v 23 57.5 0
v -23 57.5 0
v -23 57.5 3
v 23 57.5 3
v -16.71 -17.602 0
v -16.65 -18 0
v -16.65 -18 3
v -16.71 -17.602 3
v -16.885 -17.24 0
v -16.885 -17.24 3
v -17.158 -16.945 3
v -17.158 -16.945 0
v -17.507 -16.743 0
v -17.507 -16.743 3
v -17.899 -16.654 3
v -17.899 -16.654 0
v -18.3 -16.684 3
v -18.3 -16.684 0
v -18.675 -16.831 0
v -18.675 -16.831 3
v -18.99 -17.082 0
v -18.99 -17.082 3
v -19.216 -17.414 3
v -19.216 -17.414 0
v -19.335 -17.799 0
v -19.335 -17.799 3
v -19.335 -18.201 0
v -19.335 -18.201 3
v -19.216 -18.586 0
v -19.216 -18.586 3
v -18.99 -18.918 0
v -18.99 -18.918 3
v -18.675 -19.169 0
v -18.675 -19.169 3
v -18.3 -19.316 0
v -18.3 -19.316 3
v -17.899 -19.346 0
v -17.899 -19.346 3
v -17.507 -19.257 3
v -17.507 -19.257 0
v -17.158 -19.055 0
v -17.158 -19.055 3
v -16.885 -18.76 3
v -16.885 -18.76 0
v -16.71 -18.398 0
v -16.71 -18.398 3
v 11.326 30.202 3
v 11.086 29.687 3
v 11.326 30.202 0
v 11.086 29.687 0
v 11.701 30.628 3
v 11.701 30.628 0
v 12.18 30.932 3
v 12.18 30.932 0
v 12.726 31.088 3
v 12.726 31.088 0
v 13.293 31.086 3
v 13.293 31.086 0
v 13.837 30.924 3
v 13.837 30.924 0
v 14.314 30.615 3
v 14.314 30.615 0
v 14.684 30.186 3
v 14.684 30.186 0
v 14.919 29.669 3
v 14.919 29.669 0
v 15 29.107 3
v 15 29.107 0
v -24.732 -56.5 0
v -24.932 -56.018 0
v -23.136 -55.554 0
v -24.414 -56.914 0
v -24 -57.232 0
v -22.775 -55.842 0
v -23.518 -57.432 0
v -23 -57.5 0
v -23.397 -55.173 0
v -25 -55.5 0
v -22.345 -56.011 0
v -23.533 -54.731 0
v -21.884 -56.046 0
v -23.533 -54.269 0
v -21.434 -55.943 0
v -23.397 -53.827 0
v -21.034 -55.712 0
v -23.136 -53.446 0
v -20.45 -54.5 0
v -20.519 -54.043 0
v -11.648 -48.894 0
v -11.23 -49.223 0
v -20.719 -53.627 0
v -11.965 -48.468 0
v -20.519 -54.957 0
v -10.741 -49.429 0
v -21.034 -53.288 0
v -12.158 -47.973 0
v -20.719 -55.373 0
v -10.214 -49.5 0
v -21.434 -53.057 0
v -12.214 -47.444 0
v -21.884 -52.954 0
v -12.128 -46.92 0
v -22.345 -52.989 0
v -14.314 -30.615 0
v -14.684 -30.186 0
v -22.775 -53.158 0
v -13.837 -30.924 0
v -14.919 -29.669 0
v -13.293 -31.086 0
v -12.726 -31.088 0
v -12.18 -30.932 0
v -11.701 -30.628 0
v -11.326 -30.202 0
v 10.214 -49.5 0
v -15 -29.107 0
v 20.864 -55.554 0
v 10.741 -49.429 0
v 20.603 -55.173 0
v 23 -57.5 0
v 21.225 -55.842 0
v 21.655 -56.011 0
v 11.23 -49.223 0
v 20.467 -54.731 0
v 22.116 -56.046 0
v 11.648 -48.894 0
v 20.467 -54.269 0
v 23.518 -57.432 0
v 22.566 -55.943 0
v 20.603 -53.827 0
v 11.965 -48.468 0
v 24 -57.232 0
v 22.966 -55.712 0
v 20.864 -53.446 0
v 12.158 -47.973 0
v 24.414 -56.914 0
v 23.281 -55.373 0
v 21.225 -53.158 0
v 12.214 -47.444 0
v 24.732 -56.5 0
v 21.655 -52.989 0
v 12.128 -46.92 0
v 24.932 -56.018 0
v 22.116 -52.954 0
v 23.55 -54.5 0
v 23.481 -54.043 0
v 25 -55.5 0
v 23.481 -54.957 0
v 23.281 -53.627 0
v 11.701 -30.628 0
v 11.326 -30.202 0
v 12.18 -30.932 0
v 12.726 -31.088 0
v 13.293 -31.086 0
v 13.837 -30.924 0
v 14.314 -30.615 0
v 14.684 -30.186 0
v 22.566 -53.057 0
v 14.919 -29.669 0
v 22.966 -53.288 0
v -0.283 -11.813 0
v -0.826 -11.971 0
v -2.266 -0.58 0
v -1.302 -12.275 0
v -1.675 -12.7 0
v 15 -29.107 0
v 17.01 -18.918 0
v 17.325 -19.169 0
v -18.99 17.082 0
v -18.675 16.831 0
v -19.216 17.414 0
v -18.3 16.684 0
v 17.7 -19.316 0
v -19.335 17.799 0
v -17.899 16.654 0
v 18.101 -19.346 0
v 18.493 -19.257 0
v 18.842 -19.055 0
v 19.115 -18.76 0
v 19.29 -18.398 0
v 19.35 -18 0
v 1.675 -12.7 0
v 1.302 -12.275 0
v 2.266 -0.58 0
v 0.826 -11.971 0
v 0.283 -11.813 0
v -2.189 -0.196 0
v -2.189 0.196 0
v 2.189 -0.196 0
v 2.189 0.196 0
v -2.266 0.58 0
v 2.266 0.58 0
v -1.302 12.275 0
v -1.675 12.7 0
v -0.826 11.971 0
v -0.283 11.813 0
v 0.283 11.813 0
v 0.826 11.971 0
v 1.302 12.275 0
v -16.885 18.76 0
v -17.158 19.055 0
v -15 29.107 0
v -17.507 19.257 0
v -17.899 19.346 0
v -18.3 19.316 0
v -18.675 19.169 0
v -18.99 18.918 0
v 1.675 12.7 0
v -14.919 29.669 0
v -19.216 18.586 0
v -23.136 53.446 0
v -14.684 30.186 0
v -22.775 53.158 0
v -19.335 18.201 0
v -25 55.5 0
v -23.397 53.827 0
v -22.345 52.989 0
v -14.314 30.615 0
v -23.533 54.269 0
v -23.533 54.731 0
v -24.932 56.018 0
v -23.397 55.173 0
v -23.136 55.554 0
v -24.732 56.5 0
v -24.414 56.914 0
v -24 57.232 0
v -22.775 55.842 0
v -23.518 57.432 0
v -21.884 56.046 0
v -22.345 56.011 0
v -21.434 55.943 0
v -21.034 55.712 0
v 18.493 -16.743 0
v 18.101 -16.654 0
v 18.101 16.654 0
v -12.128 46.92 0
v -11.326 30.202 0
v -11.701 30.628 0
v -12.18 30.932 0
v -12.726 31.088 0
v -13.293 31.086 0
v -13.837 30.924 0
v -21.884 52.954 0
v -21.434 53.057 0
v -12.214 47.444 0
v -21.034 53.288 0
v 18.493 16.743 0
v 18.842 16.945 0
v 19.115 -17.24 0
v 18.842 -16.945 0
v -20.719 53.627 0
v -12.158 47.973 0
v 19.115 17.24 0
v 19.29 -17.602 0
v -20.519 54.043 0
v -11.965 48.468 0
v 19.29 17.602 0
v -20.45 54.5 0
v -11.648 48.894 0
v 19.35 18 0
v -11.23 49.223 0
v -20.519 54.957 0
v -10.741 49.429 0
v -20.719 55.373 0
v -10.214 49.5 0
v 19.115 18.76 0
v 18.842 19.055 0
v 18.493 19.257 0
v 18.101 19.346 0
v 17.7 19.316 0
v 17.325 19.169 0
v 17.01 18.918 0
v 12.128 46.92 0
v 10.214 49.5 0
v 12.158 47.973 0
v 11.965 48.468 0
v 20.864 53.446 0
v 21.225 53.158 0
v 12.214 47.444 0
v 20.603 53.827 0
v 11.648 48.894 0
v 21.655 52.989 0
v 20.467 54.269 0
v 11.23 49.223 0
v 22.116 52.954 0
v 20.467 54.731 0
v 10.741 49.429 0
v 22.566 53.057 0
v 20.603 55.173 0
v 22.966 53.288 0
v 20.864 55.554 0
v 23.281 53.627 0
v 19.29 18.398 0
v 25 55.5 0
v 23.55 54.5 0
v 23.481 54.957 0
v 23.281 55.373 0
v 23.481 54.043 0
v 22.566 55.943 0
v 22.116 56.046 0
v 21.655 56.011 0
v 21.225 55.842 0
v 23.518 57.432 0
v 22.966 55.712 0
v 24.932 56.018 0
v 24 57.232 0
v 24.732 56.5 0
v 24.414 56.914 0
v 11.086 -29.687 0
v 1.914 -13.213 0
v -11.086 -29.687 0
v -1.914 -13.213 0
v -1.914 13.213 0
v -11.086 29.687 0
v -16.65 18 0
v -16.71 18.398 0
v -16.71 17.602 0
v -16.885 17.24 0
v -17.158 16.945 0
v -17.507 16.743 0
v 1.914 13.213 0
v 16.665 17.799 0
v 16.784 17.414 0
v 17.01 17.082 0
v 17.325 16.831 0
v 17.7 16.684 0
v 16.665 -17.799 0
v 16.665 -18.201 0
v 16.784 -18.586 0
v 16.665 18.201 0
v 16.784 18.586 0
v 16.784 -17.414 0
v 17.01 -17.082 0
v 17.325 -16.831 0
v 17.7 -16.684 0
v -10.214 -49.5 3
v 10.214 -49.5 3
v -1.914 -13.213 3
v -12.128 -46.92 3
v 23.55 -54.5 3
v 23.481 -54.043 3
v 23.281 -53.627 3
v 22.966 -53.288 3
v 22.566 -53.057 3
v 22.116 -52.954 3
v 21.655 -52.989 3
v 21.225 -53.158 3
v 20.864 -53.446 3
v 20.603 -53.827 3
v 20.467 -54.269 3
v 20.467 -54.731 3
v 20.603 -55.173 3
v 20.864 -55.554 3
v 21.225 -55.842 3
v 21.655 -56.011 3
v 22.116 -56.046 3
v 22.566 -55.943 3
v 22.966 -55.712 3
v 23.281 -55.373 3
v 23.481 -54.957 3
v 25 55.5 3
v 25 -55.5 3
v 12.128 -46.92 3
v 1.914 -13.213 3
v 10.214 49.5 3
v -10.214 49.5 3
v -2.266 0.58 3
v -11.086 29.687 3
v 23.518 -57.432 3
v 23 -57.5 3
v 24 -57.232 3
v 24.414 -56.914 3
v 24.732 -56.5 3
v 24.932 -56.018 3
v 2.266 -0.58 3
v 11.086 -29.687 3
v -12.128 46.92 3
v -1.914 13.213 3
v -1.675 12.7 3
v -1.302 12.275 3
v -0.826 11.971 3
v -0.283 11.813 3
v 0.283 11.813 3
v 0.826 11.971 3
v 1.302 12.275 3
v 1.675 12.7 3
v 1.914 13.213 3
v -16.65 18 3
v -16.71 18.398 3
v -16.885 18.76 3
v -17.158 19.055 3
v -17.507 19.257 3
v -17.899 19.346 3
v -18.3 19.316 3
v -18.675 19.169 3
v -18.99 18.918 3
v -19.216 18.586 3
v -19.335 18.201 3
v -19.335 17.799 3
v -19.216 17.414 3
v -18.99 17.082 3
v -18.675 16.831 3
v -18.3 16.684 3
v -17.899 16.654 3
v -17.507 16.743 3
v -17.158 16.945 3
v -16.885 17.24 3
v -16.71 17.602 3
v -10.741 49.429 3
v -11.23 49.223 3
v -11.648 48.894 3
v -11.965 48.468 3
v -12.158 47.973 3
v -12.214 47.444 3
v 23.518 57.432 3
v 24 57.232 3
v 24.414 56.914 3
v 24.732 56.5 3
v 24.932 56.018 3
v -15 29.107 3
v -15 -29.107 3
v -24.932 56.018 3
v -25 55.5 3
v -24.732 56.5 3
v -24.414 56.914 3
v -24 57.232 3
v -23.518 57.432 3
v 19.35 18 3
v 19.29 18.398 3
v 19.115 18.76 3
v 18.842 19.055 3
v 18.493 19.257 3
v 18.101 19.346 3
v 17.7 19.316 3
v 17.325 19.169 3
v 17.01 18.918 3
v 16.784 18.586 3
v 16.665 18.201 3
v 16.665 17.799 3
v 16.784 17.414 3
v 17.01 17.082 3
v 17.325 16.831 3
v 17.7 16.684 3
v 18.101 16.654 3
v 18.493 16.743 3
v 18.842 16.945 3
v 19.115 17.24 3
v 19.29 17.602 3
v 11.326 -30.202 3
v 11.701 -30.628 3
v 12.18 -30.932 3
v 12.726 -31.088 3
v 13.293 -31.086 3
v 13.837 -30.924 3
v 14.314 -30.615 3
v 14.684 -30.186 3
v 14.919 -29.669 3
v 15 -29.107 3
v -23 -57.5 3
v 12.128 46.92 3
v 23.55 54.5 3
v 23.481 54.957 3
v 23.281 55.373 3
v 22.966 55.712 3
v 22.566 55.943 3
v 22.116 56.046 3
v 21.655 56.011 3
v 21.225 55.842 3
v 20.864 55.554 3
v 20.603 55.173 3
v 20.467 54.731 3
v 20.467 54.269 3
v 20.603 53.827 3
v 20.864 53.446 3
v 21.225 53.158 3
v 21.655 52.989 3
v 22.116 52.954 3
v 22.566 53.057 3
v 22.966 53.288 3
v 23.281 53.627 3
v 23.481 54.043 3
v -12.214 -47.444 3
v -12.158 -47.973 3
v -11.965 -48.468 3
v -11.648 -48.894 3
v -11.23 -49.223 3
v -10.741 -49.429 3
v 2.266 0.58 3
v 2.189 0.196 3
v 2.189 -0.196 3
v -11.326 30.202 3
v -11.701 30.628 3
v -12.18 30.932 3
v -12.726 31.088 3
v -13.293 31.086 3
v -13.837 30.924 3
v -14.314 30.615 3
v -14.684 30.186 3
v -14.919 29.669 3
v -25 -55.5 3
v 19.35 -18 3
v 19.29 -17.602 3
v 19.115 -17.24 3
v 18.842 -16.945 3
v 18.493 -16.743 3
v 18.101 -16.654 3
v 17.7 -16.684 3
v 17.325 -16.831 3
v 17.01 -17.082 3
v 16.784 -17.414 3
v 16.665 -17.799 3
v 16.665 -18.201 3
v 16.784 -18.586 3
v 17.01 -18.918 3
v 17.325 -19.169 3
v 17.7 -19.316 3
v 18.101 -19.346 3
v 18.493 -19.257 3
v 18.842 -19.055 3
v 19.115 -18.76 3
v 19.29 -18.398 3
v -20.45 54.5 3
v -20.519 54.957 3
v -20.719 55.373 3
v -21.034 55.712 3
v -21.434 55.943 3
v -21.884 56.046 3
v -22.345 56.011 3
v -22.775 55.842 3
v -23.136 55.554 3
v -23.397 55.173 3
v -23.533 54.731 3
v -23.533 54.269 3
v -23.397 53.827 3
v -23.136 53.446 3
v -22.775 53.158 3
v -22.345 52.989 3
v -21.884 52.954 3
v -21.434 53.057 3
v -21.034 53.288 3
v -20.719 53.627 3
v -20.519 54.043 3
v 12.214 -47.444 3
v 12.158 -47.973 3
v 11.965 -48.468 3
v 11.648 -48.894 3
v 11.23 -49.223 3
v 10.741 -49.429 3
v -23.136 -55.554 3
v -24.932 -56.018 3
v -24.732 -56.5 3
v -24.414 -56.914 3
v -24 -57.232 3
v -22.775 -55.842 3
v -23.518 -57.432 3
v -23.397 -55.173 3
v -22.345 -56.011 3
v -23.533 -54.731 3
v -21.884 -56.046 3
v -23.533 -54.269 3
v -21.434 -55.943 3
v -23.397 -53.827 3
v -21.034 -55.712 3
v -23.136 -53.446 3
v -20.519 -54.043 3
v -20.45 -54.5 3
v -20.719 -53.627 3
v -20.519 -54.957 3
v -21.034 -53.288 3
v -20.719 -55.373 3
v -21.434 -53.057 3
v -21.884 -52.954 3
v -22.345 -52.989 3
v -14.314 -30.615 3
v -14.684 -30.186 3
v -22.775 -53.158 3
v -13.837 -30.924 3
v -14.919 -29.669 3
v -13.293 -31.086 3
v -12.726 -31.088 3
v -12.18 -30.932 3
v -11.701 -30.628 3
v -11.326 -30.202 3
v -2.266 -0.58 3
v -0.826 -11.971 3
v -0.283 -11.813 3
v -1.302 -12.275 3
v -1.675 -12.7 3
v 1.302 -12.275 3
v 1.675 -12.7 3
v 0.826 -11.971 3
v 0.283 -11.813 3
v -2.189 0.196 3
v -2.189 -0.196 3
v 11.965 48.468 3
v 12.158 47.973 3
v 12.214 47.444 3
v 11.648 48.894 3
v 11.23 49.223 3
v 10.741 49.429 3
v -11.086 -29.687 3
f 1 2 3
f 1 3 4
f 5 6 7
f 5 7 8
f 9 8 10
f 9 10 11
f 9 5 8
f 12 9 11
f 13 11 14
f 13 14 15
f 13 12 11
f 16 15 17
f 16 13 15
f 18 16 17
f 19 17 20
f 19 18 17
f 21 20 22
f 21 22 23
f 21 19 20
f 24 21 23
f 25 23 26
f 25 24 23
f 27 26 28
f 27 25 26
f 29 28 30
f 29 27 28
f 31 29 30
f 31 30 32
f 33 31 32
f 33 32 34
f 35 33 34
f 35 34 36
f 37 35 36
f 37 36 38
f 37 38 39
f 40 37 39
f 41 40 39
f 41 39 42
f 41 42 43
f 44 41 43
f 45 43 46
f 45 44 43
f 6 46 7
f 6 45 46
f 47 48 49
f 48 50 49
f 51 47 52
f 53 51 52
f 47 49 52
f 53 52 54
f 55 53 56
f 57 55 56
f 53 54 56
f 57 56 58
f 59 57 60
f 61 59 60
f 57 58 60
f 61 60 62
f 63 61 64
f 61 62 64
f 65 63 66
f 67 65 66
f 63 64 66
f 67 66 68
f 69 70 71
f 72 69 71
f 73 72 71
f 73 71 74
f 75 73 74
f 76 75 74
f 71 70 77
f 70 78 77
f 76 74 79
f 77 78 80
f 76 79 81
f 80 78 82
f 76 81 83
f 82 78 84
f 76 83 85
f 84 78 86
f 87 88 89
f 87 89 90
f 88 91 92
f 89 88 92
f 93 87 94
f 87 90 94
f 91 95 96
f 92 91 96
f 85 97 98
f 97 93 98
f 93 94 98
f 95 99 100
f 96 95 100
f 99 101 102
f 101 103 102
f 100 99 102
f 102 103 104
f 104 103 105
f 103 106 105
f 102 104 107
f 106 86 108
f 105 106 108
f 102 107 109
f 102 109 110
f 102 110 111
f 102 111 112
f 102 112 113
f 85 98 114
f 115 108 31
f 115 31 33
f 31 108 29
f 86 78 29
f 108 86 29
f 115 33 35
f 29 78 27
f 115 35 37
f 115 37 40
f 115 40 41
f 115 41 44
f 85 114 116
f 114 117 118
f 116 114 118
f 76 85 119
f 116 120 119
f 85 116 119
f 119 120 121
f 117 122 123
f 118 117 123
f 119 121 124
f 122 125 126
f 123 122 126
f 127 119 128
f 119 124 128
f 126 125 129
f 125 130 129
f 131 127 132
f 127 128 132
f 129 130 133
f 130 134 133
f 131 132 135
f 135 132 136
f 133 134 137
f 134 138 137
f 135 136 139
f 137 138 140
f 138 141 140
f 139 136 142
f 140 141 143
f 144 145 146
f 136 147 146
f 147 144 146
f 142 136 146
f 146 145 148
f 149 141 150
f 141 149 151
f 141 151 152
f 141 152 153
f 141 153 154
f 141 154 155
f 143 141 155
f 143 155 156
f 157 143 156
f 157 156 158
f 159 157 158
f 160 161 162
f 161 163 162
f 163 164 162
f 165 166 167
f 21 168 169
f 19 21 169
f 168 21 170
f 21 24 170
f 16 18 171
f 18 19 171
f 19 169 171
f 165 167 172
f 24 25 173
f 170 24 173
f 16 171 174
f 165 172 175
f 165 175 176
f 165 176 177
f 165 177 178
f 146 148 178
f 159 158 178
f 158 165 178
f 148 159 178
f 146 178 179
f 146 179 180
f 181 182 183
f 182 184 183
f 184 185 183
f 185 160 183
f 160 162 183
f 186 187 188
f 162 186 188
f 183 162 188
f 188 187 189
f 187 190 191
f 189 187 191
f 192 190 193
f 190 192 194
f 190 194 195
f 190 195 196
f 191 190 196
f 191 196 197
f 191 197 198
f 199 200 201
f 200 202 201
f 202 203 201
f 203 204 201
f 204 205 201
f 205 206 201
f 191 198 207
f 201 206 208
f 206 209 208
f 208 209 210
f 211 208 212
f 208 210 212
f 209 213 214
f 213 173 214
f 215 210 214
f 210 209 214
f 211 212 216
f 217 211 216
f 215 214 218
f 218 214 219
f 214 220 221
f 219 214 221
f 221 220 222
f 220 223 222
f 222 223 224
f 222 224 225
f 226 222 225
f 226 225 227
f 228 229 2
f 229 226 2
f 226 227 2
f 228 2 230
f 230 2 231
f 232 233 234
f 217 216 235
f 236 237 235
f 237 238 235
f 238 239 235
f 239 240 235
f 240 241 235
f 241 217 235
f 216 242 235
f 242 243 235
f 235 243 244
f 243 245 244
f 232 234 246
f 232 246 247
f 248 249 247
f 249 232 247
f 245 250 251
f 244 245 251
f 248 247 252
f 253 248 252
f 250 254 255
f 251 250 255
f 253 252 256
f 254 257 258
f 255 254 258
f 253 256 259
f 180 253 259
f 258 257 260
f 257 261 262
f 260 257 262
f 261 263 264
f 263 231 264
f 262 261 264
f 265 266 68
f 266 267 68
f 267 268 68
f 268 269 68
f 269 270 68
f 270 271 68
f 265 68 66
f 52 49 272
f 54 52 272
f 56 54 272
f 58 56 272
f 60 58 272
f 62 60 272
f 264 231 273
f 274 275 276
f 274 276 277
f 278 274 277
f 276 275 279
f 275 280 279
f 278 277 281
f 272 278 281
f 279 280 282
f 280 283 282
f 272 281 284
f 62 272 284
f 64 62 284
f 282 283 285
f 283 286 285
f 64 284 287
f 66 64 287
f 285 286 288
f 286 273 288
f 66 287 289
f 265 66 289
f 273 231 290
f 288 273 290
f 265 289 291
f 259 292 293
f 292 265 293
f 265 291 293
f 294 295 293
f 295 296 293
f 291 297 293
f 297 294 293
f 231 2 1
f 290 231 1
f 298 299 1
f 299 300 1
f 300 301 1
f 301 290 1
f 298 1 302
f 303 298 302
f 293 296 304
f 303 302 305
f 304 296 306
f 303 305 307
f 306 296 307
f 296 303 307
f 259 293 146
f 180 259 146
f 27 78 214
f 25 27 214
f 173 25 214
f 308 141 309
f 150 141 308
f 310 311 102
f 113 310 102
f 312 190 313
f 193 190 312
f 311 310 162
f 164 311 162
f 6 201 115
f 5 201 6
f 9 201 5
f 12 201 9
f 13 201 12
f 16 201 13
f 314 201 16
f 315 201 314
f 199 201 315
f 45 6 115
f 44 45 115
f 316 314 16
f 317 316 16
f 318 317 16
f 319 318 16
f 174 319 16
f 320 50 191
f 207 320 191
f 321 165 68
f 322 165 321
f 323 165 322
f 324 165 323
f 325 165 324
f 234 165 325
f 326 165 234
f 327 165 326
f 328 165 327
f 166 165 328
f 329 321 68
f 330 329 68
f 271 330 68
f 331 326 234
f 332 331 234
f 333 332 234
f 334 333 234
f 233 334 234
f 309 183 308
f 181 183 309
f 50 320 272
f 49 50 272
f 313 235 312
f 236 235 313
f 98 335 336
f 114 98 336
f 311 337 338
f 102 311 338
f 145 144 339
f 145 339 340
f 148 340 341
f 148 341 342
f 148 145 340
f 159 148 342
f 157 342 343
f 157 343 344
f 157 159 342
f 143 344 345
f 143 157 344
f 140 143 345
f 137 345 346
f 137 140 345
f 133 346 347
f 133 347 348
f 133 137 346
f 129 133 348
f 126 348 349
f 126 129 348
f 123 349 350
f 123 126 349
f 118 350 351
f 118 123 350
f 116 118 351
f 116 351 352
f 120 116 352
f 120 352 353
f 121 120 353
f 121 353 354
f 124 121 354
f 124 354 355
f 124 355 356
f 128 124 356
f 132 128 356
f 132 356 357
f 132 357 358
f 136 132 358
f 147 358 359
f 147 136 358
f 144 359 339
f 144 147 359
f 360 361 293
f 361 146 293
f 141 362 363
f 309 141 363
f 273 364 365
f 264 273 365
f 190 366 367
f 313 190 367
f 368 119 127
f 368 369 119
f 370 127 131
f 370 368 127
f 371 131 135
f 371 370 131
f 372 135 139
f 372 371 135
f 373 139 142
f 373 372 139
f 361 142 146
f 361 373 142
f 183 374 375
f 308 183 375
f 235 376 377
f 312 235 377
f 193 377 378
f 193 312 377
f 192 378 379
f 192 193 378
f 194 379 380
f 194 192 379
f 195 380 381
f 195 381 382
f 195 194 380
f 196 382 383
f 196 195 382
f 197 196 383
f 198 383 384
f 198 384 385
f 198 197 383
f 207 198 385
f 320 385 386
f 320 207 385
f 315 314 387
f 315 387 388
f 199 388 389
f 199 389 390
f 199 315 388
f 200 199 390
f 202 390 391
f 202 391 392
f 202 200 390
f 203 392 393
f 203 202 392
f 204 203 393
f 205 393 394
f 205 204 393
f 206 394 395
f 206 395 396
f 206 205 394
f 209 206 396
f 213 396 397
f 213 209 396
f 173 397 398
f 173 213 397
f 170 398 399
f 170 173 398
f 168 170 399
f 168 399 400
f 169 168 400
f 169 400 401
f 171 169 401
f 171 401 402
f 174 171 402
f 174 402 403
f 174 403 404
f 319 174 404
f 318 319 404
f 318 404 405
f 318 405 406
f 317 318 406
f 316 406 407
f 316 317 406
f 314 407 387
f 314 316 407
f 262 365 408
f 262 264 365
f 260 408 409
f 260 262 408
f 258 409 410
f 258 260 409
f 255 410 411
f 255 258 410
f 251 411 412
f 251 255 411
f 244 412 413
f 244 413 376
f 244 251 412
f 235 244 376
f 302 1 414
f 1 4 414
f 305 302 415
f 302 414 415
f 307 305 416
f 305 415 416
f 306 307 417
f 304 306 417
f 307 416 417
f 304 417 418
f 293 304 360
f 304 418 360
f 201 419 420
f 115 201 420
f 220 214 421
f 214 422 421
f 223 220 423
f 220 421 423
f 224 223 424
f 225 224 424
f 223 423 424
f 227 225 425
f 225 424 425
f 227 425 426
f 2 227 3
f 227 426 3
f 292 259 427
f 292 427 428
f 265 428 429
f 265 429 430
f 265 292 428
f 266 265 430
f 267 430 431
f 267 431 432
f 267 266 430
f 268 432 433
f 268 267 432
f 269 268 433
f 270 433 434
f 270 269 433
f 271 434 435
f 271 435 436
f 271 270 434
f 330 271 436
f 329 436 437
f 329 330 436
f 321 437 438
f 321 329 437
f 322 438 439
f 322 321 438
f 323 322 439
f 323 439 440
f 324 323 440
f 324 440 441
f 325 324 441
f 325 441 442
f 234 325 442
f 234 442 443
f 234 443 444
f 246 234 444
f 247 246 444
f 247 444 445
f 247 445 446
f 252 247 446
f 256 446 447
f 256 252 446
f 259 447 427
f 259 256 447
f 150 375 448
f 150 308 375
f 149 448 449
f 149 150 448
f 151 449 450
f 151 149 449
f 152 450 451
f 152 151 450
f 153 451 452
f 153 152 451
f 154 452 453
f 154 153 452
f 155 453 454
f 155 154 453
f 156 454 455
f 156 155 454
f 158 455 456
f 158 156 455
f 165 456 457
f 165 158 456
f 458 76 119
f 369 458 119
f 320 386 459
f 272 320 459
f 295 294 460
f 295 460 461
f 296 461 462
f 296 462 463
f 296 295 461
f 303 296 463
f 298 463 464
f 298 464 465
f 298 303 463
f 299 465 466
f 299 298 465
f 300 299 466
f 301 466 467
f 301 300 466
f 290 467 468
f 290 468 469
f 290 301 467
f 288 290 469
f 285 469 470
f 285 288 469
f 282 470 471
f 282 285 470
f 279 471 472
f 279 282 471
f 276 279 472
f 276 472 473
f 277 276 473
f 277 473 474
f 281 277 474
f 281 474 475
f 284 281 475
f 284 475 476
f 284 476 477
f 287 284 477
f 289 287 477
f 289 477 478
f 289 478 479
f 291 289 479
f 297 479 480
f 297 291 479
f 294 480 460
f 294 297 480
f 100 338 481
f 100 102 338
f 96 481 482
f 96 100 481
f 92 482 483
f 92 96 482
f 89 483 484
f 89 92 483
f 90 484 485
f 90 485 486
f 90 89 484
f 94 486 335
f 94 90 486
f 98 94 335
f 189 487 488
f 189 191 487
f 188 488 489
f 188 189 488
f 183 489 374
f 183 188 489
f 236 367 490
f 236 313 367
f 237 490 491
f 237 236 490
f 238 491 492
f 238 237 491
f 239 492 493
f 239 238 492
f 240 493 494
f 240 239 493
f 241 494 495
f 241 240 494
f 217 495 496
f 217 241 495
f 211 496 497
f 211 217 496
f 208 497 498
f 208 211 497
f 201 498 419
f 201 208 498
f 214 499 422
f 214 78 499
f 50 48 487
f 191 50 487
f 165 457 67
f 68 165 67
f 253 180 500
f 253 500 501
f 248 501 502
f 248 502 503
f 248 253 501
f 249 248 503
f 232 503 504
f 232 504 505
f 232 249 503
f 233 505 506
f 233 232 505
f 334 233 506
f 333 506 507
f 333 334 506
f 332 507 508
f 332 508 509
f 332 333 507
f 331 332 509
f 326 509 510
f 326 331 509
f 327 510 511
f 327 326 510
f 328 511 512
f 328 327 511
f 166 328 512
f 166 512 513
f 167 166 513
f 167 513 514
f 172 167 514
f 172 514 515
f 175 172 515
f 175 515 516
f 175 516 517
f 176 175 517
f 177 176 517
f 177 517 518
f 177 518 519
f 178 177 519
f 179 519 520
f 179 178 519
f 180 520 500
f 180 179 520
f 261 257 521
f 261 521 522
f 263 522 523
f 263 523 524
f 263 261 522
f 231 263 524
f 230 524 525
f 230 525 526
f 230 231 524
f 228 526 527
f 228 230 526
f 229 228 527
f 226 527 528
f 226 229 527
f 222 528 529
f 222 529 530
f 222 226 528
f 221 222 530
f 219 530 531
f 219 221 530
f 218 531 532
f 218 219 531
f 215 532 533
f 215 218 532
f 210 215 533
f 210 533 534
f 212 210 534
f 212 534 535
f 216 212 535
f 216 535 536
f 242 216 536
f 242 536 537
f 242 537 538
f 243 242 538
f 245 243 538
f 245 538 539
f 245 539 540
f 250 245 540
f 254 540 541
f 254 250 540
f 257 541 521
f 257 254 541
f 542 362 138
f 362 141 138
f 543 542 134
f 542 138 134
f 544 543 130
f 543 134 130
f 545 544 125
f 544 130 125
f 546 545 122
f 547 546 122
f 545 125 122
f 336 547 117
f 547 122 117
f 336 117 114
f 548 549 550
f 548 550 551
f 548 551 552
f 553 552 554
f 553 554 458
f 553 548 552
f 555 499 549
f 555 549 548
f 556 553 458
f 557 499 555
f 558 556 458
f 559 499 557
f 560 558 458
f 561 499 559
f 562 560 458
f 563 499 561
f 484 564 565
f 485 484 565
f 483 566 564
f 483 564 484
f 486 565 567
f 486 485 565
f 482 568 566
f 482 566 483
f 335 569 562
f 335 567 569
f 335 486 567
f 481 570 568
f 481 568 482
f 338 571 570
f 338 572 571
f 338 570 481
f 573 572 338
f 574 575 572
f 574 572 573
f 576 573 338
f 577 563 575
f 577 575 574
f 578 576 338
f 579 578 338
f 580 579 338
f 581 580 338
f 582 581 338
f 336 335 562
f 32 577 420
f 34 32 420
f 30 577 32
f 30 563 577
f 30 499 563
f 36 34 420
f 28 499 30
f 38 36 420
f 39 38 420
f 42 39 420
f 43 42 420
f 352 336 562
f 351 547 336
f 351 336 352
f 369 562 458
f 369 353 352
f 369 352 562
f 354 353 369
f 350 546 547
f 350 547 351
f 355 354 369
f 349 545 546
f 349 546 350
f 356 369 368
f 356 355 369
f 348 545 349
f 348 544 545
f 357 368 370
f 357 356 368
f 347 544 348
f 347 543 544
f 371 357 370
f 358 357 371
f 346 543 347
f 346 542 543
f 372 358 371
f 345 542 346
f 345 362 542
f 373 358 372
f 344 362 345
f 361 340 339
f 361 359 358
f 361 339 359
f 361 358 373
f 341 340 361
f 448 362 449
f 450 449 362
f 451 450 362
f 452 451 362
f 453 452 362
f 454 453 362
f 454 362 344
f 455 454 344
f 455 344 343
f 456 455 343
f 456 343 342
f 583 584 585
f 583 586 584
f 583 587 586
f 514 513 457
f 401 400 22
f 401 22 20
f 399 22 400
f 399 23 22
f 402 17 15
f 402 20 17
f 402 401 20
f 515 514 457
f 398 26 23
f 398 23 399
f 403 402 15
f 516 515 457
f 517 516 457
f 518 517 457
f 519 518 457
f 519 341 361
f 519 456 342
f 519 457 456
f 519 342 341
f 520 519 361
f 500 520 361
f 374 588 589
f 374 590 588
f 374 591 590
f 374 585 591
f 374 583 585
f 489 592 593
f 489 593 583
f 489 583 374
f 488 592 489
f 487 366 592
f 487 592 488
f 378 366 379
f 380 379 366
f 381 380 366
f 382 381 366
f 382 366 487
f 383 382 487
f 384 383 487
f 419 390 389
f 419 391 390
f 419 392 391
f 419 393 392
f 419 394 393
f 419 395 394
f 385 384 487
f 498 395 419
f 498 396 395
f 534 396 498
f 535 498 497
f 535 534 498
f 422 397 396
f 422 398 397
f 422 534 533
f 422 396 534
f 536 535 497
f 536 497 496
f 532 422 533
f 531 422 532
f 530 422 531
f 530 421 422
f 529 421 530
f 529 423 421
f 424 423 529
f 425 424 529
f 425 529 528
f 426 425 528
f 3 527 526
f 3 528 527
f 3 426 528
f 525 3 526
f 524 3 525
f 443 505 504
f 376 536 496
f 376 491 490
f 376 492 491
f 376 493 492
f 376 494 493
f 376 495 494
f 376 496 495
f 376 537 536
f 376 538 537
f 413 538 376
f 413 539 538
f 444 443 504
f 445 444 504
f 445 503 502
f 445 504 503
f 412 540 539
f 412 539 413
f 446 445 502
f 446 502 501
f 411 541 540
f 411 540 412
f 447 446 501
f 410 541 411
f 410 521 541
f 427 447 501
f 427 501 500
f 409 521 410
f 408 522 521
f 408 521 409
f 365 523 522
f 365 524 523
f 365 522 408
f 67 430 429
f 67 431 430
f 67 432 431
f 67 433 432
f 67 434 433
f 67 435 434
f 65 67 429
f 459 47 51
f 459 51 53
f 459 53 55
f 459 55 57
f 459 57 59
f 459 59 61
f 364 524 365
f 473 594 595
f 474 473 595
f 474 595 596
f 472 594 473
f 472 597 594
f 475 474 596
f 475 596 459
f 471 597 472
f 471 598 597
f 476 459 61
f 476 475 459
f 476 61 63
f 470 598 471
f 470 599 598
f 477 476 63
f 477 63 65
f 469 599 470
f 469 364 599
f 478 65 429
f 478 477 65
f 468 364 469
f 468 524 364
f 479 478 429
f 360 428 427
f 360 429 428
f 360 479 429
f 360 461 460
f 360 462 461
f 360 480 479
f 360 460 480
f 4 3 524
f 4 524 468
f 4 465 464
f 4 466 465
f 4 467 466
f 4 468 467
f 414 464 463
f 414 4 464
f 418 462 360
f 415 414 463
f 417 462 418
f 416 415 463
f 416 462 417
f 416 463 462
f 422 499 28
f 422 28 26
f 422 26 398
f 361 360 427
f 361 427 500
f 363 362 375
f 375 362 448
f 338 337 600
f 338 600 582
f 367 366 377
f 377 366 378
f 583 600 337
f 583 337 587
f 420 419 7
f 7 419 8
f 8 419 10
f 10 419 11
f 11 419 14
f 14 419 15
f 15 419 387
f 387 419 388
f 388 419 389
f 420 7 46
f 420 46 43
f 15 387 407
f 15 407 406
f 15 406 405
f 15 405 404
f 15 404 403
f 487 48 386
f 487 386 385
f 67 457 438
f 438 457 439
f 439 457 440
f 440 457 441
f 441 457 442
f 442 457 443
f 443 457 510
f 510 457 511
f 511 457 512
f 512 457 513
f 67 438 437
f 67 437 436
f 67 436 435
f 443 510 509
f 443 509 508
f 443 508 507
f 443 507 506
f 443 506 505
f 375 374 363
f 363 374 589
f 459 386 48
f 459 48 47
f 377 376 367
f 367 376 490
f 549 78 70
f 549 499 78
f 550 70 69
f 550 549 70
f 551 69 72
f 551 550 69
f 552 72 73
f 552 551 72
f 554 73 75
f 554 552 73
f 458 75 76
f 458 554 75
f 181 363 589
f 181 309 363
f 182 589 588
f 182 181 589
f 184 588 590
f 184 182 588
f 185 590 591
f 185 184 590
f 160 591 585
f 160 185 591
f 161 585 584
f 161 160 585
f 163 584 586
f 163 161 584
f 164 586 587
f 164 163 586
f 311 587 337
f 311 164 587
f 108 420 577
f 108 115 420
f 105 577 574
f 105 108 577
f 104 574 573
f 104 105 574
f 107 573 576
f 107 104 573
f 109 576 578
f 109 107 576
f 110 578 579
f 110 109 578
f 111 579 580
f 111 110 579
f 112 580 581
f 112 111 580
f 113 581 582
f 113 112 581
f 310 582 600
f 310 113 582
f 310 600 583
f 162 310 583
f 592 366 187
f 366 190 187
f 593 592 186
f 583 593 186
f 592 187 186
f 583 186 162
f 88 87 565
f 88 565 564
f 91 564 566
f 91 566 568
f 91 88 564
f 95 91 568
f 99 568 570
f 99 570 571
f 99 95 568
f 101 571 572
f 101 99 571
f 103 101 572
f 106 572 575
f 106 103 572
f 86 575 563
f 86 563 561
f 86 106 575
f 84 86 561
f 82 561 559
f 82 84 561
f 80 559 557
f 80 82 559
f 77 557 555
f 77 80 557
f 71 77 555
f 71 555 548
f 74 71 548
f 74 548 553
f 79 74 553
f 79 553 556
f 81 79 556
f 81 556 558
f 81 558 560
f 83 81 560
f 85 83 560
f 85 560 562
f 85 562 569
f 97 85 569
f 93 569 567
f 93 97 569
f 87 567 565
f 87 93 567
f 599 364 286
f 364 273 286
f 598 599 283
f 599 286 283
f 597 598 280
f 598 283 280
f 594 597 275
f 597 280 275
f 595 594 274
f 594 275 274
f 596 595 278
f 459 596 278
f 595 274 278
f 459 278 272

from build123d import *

# Parameters (mm, degrees)
SKETCH_1_W          = 50
SKETCH_1_H          = 50
SKETCH_1_R          = 1.35
EXTRUDE_1_DEPTH     = 3
EXTRUDE_START       = -3
SKETCH_2_W          = 50
SKETCH_2_H          = 115
SKETCH_2_R          = 1.35
SKETCH_2_R_2        = 1.55
EXTRUDE_2_DEPTH     = 3
CUT_EXTRUDE_1_DEPTH = 63.77141069
FILLET_2_R          = 2


with BuildPart() as part:
    # 草图1 → 凸台-拉伸1 (new body)
    with BuildSketch(Plane.XY):
        Rectangle(SKETCH_1_W, SKETCH_1_H)
        with Locations((18, 18)):
            Circle(SKETCH_1_R, mode=Mode.SUBTRACT)
        with Locations((-18, 18)):
            Circle(SKETCH_1_R, mode=Mode.SUBTRACT)
        with Locations((-18, -18)):
            Circle(SKETCH_1_R, mode=Mode.SUBTRACT)
        with Locations((18, -18)):
            Circle(SKETCH_1_R, mode=Mode.SUBTRACT)
    extrude(amount=EXTRUDE_1_DEPTH)

    # 草图2 → 凸台-拉伸2 (add)
    with BuildSketch(Plane.XY.offset(3).offset(EXTRUDE_START)):
        Rectangle(SKETCH_2_W, SKETCH_2_H)
        with Locations((18, 18)):
            Circle(SKETCH_2_R, mode=Mode.SUBTRACT)
        with Locations((18, -18)):
            Circle(SKETCH_2_R, mode=Mode.SUBTRACT)
        with Locations((-18, -18)):
            Circle(SKETCH_2_R, mode=Mode.SUBTRACT)
        with Locations((-18, 18)):
            Circle(SKETCH_2_R, mode=Mode.SUBTRACT)
        with Locations((-22, 54.5)):
            Circle(SKETCH_2_R_2, mode=Mode.SUBTRACT)
        with Locations((22, 54.5)):
            Circle(SKETCH_2_R_2, mode=Mode.SUBTRACT)
        with Locations((-22, -54.5)):
            Circle(SKETCH_2_R_2, mode=Mode.SUBTRACT)
        with Locations((22, -54.5)):
            Circle(SKETCH_2_R_2, mode=Mode.SUBTRACT)
    extrude(amount=EXTRUDE_2_DEPTH)

    # 草图8 → 切除-拉伸1 (cut, through all)
    with BuildSketch(Plane.XY.offset(3)):
        Polygon((12.910189133, -49.5), (0, -6.89637586), (-12.910189133, -49.5), align=None)
        Polygon((15, 42.60362414), (2.089810867, 0), (15, -42.60362414), align=None)
        Polygon((12.910189133, 49.5), (-12.910189133, 49.5), (0, 6.89637586), align=None)
        Polygon((-2.089810867, 0), (-15, 42.60362414), (-15, -42.60362414), align=None)
    extrude(amount=-CUT_EXTRUDE_1_DEPTH, mode=Mode.SUBTRACT)

    # 圆角2
    fillet_2_edges = [part.edges().sort_by_distance(p)[0] for p in [
        (25, 57.5, 1.5),
        (-25, -57.5, 1.5),
        (25, -57.5, 1.5),
        (-25, 57.5, 1.5),
        (0, 6.89637586, 1.5),
        (-12.910189133, 49.5, 1.5),
        (12.910189133, 49.5, 1.5),
        (2.089810867, 0, 1.5),
        (15, 42.60362414, 1.5),
        (15, -42.60362414, 1.5),
        (-15, -42.60362414, 1.5),
        (-15, 42.60362414, 1.5),
        (-2.089810867, 0, 1.5),
        (-12.910189133, -49.5, 1.5),
        (0, -6.89637586, 1.5),
        (12.910189133, -49.5, 1.5),
    ]]
    fillet(fillet_2_edges, radius=FILLET_2_R)


solid = part.part
